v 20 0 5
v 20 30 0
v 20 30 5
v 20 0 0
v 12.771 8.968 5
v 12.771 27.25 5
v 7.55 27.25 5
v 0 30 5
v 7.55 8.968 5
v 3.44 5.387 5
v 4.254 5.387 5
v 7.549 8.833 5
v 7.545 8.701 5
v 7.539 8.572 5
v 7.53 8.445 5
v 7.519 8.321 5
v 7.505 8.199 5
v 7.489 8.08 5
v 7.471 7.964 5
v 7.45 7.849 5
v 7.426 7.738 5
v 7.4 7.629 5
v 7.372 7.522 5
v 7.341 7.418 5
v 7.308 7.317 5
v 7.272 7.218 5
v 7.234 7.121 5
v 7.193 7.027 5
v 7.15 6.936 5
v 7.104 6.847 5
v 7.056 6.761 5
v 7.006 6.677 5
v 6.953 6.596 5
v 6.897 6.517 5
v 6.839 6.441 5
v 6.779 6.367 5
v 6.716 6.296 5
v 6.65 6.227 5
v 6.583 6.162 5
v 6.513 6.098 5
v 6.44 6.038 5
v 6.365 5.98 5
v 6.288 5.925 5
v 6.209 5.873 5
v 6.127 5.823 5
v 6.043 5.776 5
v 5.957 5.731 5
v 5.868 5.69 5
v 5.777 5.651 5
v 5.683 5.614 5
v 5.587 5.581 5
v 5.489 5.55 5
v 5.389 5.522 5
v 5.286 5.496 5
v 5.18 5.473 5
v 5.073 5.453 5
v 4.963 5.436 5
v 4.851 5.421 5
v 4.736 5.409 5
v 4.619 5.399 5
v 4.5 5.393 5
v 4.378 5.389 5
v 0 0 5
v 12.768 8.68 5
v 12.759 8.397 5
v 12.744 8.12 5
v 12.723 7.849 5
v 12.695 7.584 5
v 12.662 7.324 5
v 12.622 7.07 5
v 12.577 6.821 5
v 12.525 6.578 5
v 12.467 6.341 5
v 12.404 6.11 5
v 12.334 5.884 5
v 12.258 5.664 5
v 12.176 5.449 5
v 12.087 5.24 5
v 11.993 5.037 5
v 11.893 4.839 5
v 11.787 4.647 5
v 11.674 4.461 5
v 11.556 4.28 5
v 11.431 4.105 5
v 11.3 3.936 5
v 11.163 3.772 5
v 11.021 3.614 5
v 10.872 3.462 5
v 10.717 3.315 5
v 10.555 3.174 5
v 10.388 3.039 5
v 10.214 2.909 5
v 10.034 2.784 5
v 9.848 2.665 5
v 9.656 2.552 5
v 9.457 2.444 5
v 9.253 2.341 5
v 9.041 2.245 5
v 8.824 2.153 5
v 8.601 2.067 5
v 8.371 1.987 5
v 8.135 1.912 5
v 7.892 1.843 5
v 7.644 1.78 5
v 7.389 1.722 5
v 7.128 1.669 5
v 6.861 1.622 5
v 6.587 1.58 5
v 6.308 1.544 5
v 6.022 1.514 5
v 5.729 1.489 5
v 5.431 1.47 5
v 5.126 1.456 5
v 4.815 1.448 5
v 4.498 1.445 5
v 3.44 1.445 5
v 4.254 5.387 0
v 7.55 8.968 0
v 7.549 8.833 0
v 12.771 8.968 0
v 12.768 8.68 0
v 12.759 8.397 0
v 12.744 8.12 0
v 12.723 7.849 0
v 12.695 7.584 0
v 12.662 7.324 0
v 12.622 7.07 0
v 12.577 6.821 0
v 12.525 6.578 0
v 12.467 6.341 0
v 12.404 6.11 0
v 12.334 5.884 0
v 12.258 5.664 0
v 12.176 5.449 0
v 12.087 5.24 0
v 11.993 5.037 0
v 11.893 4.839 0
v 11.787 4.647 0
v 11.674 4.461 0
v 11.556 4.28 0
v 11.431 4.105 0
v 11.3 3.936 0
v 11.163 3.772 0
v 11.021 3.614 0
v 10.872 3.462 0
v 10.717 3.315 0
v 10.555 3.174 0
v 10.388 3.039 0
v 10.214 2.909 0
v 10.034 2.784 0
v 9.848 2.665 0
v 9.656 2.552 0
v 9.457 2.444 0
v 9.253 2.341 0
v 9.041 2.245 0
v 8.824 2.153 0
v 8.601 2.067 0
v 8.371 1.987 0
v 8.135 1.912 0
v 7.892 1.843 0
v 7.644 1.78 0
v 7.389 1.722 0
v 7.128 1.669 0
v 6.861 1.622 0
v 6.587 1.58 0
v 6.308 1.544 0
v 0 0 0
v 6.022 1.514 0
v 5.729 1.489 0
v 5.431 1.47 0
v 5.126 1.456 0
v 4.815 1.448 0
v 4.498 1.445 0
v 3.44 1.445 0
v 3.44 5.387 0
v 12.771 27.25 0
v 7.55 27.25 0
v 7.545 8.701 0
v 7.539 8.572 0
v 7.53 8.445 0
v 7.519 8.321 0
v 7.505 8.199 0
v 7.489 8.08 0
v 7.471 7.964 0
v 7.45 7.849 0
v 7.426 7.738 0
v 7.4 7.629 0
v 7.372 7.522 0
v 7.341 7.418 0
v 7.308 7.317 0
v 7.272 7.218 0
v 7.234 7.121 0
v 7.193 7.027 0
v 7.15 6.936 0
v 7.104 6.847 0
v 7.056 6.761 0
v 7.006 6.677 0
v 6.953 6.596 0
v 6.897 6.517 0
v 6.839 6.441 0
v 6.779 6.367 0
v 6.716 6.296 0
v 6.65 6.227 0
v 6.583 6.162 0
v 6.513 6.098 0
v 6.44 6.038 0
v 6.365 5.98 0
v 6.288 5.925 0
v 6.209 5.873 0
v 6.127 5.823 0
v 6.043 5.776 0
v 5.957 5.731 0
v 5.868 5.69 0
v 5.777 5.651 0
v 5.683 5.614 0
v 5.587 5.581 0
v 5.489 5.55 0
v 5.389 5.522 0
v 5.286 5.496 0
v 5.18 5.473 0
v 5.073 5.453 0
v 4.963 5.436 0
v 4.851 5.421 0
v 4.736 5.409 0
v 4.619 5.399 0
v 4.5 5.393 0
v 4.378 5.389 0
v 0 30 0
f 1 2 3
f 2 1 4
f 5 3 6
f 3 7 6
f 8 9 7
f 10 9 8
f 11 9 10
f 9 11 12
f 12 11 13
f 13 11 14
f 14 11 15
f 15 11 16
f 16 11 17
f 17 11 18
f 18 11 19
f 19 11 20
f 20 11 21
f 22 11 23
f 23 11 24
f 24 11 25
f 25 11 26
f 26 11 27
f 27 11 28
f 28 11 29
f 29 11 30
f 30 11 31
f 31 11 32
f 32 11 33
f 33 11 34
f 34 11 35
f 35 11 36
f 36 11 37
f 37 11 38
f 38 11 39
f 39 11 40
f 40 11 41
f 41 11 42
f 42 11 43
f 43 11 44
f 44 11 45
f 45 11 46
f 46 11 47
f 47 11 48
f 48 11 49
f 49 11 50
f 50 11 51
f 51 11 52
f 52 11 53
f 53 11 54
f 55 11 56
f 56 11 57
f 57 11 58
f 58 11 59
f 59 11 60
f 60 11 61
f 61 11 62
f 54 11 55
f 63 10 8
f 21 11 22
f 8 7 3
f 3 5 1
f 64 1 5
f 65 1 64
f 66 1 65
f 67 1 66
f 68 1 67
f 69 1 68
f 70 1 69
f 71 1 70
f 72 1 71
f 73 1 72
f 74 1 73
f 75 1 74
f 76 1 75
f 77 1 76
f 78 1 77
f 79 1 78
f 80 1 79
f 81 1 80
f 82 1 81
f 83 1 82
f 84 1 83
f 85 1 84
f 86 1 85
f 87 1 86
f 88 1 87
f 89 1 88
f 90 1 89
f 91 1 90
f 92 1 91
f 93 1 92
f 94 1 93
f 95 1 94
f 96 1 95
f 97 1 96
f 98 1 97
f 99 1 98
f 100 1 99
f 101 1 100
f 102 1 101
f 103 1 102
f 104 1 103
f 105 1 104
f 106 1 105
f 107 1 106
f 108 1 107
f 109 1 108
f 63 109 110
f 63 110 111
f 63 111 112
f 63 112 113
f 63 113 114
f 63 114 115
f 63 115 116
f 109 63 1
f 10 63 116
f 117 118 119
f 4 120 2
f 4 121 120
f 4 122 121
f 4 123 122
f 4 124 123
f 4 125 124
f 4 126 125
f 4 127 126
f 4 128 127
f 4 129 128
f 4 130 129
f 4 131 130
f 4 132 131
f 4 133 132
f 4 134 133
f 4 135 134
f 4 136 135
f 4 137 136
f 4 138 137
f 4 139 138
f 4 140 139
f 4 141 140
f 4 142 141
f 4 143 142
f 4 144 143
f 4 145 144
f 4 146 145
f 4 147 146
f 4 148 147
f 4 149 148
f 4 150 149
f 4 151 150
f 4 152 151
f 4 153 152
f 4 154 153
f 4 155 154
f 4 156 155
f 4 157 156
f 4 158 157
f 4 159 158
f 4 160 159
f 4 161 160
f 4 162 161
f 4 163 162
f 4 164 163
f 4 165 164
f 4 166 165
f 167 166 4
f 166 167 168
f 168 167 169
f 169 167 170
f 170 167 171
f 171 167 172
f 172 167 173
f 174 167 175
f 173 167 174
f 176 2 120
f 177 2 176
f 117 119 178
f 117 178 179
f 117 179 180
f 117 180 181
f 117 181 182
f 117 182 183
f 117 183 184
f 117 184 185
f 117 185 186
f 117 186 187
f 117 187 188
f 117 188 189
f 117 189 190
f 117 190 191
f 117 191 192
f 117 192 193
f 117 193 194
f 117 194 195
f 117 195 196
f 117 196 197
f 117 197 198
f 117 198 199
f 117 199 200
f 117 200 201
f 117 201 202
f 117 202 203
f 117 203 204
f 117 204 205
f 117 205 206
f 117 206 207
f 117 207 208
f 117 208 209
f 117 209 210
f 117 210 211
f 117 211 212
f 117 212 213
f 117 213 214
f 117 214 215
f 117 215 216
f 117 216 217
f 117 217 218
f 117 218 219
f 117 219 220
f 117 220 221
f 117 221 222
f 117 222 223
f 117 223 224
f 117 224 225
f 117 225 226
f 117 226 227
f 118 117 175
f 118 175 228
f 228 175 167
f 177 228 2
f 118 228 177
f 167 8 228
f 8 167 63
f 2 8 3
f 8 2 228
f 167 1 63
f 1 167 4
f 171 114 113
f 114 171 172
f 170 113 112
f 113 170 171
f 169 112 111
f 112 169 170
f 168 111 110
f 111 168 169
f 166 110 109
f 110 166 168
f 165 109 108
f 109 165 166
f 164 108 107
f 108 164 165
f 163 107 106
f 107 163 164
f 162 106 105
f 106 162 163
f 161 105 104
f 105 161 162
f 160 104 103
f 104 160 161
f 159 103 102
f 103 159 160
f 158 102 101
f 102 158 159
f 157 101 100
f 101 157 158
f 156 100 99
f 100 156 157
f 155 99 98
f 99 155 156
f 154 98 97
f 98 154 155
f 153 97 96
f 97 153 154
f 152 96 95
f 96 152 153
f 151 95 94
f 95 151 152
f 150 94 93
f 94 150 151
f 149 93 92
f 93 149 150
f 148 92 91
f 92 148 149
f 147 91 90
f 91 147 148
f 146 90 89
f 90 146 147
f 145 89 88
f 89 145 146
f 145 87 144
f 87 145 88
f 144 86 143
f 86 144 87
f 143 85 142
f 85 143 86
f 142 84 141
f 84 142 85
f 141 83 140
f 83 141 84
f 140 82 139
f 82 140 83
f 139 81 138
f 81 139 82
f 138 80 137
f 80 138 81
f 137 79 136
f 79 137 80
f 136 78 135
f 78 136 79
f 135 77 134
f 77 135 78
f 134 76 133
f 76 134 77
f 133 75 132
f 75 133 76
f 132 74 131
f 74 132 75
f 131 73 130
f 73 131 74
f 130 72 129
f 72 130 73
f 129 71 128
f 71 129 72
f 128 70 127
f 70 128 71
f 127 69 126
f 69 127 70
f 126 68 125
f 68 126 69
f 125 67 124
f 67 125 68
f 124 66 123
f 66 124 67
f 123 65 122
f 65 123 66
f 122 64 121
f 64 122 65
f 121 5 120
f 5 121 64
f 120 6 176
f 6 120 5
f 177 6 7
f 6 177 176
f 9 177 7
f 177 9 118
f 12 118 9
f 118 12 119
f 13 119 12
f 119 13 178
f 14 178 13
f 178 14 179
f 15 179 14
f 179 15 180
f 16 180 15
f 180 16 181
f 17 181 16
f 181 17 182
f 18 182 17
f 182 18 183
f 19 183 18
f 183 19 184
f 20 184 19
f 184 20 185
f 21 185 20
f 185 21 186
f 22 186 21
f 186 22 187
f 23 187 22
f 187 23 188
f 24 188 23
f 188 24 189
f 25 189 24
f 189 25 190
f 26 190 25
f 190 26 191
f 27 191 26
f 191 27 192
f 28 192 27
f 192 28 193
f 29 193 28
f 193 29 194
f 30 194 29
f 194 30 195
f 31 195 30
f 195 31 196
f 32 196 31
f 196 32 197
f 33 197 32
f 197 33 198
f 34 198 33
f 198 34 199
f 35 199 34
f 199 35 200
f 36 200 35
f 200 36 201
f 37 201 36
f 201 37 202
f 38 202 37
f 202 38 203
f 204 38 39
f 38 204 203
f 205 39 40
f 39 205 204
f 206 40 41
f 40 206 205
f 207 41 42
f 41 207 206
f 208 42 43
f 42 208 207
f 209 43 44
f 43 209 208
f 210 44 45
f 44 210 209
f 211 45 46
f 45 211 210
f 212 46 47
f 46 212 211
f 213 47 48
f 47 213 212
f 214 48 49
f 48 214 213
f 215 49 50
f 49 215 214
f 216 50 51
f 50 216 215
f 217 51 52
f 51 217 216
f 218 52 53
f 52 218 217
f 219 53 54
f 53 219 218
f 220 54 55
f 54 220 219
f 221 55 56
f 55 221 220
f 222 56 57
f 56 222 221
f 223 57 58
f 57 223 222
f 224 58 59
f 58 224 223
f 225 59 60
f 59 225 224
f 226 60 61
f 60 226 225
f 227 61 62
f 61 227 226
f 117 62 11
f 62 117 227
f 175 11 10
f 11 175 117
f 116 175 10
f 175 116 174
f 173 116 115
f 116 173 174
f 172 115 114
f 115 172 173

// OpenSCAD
$fn = 200;

difference() {
    cube( [ 20, 30, 5 ] );

    translate( [ 5, 7, -1 ] )
    linear_extrude( 7 ) {
        text( "J", 20, "DejaVu Sans:style=Bold" );
    }
}
